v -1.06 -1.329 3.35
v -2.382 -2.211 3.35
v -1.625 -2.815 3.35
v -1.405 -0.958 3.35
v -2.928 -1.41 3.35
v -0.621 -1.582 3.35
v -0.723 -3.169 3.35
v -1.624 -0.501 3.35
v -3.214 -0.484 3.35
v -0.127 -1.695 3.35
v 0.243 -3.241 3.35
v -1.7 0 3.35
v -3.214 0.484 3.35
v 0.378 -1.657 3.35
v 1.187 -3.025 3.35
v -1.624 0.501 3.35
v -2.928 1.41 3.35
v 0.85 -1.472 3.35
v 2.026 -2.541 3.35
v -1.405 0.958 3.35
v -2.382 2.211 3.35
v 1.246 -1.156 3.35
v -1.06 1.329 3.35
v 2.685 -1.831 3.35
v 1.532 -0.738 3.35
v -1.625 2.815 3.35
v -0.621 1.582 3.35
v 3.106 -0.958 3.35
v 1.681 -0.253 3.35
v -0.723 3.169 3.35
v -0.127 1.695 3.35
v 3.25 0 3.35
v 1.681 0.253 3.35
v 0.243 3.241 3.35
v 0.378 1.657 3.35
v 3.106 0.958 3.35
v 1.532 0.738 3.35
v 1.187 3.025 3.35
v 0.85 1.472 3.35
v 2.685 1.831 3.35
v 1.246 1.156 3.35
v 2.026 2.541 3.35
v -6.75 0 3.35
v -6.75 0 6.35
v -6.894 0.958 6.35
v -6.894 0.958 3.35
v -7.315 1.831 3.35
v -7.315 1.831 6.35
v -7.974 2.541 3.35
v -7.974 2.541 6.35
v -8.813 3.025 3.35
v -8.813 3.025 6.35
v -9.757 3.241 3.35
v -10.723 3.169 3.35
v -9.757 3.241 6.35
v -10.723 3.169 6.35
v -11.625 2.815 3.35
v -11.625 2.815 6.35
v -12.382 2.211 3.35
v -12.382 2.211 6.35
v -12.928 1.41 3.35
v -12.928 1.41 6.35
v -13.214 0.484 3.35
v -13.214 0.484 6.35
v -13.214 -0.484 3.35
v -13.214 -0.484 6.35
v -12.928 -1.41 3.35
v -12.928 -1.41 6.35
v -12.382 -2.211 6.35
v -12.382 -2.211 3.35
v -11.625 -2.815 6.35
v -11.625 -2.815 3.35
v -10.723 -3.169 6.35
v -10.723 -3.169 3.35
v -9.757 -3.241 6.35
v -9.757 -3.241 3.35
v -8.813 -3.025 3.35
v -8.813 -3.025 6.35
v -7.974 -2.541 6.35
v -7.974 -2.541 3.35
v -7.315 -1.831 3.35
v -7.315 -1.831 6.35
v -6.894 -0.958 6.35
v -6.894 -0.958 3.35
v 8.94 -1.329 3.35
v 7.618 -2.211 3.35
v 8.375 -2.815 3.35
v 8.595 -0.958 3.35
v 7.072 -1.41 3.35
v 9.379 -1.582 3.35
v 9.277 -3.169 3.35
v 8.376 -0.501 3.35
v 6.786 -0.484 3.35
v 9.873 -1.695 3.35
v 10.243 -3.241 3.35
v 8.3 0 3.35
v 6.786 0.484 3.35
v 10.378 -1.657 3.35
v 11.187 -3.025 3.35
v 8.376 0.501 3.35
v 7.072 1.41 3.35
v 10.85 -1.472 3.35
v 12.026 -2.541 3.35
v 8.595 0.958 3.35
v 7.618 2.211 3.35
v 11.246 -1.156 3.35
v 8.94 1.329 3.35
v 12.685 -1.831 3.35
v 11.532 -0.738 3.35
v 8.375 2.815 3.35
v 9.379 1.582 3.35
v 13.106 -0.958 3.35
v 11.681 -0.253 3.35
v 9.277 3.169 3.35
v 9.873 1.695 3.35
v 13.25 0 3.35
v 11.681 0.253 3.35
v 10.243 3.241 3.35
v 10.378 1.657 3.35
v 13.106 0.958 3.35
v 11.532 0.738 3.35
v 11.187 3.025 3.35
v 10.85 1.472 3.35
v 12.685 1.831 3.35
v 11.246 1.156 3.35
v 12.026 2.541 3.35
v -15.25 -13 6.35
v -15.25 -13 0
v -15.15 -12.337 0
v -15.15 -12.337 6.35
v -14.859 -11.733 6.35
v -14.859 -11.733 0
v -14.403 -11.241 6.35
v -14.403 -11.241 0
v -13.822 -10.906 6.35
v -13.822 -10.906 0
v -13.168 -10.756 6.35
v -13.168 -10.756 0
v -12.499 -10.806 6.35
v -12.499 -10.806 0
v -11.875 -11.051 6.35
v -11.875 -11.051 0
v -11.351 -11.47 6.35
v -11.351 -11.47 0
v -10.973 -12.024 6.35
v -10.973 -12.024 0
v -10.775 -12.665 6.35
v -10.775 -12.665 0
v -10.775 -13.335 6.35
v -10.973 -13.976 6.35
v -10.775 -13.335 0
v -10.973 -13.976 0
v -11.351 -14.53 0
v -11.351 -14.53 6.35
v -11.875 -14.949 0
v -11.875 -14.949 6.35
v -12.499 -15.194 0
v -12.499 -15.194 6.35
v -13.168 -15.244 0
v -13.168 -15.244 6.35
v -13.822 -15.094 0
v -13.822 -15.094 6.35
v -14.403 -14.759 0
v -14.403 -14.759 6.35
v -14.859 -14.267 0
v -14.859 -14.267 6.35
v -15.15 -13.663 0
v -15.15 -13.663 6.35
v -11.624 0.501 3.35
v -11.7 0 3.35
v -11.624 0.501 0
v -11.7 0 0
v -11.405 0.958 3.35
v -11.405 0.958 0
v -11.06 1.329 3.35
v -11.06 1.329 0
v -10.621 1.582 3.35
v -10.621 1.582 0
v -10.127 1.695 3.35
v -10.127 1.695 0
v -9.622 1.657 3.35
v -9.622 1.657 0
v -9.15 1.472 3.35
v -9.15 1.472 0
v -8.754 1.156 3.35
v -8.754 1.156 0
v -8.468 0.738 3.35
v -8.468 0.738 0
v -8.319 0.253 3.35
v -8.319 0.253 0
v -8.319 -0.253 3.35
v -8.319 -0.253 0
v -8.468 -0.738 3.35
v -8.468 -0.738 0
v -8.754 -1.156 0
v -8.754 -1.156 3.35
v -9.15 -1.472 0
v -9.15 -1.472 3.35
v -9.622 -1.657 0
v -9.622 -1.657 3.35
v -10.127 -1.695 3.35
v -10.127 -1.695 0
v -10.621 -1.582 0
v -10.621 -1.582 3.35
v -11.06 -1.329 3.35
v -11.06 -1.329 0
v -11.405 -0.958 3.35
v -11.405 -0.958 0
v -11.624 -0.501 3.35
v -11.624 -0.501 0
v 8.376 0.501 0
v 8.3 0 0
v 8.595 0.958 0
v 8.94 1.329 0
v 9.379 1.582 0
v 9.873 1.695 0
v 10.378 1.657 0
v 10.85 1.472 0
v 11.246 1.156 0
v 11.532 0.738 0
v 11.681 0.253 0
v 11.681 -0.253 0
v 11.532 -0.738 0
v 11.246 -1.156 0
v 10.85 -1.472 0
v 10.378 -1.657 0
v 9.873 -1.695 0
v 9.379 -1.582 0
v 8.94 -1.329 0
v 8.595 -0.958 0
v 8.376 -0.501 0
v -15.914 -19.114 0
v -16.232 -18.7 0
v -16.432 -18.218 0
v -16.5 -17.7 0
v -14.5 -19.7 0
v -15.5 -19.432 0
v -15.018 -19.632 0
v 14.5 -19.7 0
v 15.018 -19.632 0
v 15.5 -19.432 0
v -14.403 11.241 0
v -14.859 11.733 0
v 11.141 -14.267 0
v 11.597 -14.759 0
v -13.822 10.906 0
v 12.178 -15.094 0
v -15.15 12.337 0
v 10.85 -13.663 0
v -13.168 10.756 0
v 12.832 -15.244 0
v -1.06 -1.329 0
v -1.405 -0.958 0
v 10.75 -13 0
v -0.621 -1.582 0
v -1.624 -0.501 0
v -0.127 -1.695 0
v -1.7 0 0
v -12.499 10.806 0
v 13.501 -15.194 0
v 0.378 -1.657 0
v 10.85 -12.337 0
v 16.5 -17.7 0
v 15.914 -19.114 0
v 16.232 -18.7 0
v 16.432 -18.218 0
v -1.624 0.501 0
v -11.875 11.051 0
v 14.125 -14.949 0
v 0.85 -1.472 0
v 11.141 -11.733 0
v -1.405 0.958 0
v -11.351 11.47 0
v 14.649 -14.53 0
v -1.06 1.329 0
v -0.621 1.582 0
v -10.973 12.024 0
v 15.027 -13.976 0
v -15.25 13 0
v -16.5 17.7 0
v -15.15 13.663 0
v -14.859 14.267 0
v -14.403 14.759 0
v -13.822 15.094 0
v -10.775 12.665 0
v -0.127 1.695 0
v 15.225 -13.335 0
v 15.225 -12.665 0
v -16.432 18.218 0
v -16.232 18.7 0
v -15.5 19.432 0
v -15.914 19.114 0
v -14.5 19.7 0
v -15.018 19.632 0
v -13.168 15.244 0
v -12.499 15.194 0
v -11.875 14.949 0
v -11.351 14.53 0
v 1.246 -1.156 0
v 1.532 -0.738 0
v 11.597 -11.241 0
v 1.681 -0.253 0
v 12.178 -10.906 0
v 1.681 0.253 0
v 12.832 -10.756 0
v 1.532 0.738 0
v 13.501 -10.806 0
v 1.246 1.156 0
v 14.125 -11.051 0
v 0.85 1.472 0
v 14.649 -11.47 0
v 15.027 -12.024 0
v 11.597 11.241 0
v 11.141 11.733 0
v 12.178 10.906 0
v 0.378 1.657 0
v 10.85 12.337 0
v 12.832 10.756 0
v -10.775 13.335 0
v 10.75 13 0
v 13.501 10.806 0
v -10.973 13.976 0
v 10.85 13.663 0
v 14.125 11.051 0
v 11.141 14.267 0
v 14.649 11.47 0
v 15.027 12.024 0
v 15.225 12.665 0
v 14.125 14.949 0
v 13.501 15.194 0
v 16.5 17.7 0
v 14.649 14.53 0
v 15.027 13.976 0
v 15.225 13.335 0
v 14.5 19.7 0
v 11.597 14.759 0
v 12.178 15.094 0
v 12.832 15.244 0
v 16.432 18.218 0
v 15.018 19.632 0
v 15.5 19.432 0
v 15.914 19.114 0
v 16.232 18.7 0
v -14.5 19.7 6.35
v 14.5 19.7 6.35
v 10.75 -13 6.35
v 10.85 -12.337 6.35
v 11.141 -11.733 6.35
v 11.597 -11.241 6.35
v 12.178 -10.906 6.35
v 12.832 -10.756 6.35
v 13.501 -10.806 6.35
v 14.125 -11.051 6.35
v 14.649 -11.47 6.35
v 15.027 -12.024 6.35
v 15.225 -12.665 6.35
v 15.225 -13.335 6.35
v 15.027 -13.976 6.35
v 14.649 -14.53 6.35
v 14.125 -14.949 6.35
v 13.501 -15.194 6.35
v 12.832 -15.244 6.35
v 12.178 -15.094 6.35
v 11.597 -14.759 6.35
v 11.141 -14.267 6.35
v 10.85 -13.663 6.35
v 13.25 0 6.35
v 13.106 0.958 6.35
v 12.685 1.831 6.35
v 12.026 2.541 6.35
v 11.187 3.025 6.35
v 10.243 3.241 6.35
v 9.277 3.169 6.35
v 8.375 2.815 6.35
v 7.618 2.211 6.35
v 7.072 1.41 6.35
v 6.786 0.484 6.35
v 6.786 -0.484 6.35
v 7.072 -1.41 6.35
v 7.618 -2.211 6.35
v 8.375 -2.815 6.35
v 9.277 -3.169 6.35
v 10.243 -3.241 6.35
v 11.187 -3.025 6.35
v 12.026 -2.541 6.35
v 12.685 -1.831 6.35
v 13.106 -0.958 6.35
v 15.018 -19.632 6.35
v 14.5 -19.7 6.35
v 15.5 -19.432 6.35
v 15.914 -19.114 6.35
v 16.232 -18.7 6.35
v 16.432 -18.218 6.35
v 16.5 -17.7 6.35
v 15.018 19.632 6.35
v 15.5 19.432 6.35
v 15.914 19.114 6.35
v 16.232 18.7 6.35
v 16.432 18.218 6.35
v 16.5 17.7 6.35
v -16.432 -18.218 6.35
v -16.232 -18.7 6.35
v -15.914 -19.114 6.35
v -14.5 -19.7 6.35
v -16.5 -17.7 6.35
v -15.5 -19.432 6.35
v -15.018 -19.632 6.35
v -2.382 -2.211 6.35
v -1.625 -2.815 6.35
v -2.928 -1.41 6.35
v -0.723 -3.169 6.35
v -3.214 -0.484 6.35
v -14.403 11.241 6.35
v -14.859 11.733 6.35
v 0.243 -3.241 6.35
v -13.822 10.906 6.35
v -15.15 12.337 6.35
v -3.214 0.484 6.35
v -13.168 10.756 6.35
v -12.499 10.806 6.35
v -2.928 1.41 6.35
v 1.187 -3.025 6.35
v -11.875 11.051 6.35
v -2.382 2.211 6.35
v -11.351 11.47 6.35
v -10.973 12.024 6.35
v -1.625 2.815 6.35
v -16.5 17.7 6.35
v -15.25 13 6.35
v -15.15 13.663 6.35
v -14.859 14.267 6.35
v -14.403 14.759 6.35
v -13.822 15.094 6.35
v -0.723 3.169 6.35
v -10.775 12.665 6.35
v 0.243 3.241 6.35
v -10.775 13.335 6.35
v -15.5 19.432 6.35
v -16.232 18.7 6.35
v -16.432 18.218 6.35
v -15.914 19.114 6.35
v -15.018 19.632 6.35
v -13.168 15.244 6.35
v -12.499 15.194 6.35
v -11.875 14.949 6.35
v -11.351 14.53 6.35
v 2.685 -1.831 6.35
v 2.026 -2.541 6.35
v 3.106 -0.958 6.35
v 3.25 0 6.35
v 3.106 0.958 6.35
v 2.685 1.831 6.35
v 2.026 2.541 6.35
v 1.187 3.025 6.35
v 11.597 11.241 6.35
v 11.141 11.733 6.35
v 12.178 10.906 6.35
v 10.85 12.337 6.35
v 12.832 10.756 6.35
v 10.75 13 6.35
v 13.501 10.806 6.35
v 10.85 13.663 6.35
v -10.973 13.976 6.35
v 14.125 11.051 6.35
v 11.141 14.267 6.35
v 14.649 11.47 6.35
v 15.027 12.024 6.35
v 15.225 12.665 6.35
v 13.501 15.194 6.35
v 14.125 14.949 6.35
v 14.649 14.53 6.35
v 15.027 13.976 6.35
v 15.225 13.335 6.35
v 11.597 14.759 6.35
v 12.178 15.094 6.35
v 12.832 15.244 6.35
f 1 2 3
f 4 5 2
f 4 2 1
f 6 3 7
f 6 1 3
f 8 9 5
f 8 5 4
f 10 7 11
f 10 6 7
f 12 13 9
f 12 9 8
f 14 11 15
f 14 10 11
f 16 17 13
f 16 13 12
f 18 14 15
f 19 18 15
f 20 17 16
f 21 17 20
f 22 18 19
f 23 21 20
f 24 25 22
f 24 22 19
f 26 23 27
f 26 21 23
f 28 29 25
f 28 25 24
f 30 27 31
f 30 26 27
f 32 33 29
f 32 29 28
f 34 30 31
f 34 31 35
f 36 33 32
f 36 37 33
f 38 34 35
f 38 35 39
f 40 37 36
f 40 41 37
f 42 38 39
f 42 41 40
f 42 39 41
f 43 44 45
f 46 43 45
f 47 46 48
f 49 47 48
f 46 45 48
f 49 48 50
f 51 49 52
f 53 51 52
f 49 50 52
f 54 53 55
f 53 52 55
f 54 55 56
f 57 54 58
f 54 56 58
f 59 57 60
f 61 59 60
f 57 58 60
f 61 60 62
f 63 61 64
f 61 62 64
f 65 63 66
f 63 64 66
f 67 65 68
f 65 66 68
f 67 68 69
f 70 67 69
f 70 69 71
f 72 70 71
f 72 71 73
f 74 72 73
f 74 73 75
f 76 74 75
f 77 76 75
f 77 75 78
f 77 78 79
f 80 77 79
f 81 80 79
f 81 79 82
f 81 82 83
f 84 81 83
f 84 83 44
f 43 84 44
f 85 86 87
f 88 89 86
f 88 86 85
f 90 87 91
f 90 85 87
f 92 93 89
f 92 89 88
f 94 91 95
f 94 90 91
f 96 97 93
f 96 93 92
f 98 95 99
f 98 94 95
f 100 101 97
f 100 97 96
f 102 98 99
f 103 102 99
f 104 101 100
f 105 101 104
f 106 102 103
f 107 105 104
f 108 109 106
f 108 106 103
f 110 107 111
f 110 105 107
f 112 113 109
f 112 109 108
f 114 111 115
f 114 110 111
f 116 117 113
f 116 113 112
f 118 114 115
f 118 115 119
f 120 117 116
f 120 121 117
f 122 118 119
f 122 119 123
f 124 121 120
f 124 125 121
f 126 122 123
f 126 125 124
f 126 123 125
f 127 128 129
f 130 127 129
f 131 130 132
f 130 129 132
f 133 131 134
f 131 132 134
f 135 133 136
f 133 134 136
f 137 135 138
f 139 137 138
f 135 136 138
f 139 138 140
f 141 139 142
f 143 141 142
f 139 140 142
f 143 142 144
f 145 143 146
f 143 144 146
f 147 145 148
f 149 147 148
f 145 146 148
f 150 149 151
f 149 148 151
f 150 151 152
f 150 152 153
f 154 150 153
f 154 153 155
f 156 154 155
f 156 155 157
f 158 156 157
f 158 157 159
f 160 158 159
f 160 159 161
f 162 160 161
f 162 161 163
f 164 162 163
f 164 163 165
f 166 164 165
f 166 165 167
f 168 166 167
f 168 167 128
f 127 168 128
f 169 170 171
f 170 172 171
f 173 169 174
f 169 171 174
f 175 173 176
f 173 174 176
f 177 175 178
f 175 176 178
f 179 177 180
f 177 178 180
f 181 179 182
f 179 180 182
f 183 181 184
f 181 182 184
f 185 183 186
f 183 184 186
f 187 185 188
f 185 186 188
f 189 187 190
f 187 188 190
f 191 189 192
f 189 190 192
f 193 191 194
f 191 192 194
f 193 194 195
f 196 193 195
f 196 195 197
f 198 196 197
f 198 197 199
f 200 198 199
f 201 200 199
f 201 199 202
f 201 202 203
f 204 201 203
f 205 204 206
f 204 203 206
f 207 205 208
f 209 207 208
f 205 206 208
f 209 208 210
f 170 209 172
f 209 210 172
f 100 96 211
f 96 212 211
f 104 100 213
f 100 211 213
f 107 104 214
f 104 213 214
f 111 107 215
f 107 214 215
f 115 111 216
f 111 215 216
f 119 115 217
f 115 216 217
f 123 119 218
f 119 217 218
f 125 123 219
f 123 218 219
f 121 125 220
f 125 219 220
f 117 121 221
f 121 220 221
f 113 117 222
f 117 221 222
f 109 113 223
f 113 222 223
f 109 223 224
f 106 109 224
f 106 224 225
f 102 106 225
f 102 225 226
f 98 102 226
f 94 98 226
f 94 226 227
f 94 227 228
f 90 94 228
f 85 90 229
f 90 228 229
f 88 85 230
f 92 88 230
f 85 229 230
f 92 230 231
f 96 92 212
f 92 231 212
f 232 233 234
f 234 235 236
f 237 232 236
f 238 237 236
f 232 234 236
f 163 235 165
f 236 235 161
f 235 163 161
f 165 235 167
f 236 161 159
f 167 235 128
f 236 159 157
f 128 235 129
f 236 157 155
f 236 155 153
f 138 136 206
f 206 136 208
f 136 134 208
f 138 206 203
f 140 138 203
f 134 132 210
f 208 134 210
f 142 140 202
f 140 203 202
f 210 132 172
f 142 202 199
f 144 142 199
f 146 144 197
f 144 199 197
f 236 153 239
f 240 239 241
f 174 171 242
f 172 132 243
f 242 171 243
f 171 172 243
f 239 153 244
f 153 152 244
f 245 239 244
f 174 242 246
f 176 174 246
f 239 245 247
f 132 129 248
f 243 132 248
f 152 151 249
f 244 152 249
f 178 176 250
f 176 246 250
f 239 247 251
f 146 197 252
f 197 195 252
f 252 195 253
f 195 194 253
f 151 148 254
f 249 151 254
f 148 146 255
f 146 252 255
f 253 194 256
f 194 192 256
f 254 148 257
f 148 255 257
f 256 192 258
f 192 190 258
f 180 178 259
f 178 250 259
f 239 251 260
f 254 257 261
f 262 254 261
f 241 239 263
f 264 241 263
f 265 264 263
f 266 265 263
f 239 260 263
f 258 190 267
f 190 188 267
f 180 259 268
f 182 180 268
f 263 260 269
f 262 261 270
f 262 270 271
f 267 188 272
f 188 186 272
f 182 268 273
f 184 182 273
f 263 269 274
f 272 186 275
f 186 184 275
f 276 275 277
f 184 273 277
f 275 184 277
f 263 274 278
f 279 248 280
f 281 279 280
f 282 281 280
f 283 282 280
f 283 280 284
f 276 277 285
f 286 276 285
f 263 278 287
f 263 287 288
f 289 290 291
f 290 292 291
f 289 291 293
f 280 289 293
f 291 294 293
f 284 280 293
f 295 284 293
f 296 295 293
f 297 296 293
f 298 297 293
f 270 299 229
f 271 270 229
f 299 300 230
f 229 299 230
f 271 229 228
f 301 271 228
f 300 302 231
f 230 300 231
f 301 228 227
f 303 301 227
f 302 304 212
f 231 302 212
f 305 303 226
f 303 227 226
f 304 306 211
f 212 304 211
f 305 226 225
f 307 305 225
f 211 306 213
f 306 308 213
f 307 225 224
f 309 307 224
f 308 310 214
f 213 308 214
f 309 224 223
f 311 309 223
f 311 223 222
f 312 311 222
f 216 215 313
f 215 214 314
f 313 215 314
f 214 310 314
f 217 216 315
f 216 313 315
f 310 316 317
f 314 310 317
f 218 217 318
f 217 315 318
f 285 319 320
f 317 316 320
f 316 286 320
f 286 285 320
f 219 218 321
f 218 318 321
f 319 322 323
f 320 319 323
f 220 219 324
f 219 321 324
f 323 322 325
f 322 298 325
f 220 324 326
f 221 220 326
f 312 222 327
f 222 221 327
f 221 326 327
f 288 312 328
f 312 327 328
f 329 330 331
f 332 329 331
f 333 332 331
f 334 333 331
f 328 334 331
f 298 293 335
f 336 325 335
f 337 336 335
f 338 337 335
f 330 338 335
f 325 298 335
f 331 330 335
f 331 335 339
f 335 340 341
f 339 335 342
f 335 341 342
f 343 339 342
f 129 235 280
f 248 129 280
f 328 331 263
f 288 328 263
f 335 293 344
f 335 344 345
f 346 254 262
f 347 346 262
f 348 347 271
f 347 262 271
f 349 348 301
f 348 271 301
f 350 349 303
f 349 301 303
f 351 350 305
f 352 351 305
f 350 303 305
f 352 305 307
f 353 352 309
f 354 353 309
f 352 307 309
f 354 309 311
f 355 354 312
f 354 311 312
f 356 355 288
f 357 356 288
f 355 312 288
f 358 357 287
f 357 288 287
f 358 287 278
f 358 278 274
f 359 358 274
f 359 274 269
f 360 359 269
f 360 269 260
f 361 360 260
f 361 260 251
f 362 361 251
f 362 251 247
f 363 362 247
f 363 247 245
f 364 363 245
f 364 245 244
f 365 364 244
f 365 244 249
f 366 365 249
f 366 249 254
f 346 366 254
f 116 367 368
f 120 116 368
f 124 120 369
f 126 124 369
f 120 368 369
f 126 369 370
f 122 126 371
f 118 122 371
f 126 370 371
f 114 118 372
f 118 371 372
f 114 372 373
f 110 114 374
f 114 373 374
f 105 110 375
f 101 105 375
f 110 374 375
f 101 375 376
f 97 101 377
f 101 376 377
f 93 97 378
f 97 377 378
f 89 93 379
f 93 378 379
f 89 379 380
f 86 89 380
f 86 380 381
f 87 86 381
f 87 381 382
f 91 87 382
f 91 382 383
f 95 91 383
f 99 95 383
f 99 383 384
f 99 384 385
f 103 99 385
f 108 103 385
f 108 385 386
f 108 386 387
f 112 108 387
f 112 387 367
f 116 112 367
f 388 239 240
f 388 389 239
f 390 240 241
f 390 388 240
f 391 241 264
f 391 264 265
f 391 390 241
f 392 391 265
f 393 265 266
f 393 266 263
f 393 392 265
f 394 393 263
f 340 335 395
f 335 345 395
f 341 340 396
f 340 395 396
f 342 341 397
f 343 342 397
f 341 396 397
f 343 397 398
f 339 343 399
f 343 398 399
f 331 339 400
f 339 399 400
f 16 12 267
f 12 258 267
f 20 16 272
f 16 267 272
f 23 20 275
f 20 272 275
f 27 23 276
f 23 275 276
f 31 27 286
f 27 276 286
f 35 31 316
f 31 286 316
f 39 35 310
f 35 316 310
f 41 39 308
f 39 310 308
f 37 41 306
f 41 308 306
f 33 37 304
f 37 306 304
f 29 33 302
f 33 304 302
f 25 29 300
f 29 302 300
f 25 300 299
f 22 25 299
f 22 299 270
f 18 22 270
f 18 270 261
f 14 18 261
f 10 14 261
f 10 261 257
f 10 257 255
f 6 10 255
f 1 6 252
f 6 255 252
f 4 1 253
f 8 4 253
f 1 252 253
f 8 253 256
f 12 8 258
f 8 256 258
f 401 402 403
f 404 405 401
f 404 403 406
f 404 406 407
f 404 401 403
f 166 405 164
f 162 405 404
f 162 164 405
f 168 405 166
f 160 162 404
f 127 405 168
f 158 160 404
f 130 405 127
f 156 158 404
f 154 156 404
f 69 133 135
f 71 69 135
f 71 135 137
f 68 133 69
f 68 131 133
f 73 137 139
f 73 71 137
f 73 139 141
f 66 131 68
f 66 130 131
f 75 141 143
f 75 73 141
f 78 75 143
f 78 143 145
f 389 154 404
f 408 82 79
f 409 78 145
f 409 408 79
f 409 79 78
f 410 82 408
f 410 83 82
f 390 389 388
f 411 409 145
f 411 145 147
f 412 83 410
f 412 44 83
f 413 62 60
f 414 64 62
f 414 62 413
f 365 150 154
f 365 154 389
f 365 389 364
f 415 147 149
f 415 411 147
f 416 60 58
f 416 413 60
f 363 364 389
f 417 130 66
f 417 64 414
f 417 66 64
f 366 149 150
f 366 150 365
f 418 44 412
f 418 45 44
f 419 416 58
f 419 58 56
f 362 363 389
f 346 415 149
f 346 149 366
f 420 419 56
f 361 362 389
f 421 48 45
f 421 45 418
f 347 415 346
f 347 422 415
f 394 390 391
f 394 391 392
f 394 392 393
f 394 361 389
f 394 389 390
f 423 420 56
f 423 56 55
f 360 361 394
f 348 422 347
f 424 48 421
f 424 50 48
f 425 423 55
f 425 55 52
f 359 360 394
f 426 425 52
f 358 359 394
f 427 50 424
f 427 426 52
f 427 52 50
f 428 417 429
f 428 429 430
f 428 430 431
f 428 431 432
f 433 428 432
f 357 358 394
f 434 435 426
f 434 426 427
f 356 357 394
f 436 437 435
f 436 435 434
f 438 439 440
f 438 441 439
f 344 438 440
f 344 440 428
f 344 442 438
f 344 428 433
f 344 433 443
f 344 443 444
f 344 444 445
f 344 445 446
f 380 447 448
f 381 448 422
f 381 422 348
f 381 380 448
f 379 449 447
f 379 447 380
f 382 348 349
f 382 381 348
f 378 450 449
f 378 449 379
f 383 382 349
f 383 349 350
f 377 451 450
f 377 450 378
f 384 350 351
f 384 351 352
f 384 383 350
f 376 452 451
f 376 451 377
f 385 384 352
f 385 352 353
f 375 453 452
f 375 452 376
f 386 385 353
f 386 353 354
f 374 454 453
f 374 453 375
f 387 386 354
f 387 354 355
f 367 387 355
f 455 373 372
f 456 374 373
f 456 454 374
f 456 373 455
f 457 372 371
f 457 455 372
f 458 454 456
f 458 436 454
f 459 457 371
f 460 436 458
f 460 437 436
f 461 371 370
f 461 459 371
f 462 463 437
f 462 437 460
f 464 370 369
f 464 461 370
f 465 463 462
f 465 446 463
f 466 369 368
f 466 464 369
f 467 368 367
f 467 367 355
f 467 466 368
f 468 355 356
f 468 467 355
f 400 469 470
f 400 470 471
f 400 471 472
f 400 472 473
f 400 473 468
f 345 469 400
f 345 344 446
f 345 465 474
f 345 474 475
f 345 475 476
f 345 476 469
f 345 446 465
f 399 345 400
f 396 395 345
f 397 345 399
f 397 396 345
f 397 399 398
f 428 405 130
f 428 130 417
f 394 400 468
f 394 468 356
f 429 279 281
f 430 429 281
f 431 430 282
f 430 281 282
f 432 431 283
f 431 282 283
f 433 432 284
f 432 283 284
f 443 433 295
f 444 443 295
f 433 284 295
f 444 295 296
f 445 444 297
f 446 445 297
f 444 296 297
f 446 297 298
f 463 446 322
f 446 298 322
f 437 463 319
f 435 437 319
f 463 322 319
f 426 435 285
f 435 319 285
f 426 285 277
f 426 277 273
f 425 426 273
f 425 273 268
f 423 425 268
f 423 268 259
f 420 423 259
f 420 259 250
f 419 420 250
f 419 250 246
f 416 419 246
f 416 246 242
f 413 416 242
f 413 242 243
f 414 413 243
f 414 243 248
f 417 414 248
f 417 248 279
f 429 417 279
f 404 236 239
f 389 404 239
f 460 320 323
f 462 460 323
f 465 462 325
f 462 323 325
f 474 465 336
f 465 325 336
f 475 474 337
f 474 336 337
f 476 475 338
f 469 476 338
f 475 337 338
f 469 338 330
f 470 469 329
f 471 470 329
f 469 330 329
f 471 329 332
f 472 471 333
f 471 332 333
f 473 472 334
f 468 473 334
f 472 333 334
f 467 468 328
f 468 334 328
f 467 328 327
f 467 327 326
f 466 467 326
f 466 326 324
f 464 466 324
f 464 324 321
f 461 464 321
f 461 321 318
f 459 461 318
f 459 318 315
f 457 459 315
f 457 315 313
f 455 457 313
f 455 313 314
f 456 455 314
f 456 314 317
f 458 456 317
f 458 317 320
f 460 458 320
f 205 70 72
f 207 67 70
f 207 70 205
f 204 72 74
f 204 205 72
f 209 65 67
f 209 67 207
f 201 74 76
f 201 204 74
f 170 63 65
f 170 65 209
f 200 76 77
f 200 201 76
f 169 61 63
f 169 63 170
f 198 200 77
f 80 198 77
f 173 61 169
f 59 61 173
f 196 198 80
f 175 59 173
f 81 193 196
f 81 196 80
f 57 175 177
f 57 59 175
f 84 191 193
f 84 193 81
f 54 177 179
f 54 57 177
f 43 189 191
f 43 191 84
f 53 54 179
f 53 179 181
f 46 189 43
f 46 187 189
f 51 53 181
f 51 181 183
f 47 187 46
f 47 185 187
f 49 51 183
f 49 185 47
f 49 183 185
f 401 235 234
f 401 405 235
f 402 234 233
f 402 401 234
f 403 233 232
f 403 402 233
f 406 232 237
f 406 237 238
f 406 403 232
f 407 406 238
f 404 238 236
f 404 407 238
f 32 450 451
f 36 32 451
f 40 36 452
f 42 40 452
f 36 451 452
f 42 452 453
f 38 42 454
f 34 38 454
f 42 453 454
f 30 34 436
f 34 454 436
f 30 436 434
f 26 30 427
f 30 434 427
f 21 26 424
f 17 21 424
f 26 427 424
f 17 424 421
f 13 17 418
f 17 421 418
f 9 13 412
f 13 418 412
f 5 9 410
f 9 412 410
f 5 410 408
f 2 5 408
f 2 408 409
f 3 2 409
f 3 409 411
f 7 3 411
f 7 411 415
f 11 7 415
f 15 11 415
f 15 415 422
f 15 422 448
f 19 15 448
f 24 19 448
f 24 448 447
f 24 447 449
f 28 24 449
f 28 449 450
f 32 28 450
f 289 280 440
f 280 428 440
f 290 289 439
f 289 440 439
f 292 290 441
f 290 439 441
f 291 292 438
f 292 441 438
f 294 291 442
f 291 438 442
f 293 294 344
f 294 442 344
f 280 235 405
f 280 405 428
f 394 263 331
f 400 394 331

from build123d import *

# Parameters (mm, degrees)
SKETCH1_W                      = 33
SKETCH1_H                      = 39.4
BOSS_EXTRUDE1_DEPTH            = 6.35
CBORE_FOR_M3_SHCS1_D           = 3.4
CBORE_FOR_M3_SHCS1_CBORE_D     = 6.5
CBORE_FOR_M3_SHCS1_CBORE_DEPTH = 3
M4_CLEARANCE_HOLE1_D           = 4.5
FILLET1_R                      = 2


with BuildPart() as part:
    # Sketch1 → Boss-Extrude1 (new body)
    with BuildSketch(Plane.XY):
        Rectangle(SKETCH1_W, SKETCH1_H)
    extrude(amount=BOSS_EXTRUDE1_DEPTH)

    # CBORE for M3 SHCS1 (through all)
    with Locations(Plane.XY.offset(6.35)):
        with Locations((-10, 0), (0, 0), (10, 0)):
            CounterBoreHole(CBORE_FOR_M3_SHCS1_D / 2, CBORE_FOR_M3_SHCS1_CBORE_D / 2, CBORE_FOR_M3_SHCS1_CBORE_DEPTH)

    # M4 Clearance Hole1 (through all)
    with Locations(Plane.XY.offset(6.35)):
        with Locations((-13, 13), (-13, -13), (13, -13), (13, 13)):
            Hole(M4_CLEARANCE_HOLE1_D / 2)

    # Fillet1
    fillet1_edges = [part.edges().sort_by_distance(p)[0] for p in [
        (-16.5, 19.7, 3.175),
        (16.5, 19.7, 3.175),
        (16.5, -19.7, 3.175),
        (-16.5, -19.7, 3.175),
    ]]
    fillet(fillet1_edges, radius=FILLET1_R)


solid = part.part
